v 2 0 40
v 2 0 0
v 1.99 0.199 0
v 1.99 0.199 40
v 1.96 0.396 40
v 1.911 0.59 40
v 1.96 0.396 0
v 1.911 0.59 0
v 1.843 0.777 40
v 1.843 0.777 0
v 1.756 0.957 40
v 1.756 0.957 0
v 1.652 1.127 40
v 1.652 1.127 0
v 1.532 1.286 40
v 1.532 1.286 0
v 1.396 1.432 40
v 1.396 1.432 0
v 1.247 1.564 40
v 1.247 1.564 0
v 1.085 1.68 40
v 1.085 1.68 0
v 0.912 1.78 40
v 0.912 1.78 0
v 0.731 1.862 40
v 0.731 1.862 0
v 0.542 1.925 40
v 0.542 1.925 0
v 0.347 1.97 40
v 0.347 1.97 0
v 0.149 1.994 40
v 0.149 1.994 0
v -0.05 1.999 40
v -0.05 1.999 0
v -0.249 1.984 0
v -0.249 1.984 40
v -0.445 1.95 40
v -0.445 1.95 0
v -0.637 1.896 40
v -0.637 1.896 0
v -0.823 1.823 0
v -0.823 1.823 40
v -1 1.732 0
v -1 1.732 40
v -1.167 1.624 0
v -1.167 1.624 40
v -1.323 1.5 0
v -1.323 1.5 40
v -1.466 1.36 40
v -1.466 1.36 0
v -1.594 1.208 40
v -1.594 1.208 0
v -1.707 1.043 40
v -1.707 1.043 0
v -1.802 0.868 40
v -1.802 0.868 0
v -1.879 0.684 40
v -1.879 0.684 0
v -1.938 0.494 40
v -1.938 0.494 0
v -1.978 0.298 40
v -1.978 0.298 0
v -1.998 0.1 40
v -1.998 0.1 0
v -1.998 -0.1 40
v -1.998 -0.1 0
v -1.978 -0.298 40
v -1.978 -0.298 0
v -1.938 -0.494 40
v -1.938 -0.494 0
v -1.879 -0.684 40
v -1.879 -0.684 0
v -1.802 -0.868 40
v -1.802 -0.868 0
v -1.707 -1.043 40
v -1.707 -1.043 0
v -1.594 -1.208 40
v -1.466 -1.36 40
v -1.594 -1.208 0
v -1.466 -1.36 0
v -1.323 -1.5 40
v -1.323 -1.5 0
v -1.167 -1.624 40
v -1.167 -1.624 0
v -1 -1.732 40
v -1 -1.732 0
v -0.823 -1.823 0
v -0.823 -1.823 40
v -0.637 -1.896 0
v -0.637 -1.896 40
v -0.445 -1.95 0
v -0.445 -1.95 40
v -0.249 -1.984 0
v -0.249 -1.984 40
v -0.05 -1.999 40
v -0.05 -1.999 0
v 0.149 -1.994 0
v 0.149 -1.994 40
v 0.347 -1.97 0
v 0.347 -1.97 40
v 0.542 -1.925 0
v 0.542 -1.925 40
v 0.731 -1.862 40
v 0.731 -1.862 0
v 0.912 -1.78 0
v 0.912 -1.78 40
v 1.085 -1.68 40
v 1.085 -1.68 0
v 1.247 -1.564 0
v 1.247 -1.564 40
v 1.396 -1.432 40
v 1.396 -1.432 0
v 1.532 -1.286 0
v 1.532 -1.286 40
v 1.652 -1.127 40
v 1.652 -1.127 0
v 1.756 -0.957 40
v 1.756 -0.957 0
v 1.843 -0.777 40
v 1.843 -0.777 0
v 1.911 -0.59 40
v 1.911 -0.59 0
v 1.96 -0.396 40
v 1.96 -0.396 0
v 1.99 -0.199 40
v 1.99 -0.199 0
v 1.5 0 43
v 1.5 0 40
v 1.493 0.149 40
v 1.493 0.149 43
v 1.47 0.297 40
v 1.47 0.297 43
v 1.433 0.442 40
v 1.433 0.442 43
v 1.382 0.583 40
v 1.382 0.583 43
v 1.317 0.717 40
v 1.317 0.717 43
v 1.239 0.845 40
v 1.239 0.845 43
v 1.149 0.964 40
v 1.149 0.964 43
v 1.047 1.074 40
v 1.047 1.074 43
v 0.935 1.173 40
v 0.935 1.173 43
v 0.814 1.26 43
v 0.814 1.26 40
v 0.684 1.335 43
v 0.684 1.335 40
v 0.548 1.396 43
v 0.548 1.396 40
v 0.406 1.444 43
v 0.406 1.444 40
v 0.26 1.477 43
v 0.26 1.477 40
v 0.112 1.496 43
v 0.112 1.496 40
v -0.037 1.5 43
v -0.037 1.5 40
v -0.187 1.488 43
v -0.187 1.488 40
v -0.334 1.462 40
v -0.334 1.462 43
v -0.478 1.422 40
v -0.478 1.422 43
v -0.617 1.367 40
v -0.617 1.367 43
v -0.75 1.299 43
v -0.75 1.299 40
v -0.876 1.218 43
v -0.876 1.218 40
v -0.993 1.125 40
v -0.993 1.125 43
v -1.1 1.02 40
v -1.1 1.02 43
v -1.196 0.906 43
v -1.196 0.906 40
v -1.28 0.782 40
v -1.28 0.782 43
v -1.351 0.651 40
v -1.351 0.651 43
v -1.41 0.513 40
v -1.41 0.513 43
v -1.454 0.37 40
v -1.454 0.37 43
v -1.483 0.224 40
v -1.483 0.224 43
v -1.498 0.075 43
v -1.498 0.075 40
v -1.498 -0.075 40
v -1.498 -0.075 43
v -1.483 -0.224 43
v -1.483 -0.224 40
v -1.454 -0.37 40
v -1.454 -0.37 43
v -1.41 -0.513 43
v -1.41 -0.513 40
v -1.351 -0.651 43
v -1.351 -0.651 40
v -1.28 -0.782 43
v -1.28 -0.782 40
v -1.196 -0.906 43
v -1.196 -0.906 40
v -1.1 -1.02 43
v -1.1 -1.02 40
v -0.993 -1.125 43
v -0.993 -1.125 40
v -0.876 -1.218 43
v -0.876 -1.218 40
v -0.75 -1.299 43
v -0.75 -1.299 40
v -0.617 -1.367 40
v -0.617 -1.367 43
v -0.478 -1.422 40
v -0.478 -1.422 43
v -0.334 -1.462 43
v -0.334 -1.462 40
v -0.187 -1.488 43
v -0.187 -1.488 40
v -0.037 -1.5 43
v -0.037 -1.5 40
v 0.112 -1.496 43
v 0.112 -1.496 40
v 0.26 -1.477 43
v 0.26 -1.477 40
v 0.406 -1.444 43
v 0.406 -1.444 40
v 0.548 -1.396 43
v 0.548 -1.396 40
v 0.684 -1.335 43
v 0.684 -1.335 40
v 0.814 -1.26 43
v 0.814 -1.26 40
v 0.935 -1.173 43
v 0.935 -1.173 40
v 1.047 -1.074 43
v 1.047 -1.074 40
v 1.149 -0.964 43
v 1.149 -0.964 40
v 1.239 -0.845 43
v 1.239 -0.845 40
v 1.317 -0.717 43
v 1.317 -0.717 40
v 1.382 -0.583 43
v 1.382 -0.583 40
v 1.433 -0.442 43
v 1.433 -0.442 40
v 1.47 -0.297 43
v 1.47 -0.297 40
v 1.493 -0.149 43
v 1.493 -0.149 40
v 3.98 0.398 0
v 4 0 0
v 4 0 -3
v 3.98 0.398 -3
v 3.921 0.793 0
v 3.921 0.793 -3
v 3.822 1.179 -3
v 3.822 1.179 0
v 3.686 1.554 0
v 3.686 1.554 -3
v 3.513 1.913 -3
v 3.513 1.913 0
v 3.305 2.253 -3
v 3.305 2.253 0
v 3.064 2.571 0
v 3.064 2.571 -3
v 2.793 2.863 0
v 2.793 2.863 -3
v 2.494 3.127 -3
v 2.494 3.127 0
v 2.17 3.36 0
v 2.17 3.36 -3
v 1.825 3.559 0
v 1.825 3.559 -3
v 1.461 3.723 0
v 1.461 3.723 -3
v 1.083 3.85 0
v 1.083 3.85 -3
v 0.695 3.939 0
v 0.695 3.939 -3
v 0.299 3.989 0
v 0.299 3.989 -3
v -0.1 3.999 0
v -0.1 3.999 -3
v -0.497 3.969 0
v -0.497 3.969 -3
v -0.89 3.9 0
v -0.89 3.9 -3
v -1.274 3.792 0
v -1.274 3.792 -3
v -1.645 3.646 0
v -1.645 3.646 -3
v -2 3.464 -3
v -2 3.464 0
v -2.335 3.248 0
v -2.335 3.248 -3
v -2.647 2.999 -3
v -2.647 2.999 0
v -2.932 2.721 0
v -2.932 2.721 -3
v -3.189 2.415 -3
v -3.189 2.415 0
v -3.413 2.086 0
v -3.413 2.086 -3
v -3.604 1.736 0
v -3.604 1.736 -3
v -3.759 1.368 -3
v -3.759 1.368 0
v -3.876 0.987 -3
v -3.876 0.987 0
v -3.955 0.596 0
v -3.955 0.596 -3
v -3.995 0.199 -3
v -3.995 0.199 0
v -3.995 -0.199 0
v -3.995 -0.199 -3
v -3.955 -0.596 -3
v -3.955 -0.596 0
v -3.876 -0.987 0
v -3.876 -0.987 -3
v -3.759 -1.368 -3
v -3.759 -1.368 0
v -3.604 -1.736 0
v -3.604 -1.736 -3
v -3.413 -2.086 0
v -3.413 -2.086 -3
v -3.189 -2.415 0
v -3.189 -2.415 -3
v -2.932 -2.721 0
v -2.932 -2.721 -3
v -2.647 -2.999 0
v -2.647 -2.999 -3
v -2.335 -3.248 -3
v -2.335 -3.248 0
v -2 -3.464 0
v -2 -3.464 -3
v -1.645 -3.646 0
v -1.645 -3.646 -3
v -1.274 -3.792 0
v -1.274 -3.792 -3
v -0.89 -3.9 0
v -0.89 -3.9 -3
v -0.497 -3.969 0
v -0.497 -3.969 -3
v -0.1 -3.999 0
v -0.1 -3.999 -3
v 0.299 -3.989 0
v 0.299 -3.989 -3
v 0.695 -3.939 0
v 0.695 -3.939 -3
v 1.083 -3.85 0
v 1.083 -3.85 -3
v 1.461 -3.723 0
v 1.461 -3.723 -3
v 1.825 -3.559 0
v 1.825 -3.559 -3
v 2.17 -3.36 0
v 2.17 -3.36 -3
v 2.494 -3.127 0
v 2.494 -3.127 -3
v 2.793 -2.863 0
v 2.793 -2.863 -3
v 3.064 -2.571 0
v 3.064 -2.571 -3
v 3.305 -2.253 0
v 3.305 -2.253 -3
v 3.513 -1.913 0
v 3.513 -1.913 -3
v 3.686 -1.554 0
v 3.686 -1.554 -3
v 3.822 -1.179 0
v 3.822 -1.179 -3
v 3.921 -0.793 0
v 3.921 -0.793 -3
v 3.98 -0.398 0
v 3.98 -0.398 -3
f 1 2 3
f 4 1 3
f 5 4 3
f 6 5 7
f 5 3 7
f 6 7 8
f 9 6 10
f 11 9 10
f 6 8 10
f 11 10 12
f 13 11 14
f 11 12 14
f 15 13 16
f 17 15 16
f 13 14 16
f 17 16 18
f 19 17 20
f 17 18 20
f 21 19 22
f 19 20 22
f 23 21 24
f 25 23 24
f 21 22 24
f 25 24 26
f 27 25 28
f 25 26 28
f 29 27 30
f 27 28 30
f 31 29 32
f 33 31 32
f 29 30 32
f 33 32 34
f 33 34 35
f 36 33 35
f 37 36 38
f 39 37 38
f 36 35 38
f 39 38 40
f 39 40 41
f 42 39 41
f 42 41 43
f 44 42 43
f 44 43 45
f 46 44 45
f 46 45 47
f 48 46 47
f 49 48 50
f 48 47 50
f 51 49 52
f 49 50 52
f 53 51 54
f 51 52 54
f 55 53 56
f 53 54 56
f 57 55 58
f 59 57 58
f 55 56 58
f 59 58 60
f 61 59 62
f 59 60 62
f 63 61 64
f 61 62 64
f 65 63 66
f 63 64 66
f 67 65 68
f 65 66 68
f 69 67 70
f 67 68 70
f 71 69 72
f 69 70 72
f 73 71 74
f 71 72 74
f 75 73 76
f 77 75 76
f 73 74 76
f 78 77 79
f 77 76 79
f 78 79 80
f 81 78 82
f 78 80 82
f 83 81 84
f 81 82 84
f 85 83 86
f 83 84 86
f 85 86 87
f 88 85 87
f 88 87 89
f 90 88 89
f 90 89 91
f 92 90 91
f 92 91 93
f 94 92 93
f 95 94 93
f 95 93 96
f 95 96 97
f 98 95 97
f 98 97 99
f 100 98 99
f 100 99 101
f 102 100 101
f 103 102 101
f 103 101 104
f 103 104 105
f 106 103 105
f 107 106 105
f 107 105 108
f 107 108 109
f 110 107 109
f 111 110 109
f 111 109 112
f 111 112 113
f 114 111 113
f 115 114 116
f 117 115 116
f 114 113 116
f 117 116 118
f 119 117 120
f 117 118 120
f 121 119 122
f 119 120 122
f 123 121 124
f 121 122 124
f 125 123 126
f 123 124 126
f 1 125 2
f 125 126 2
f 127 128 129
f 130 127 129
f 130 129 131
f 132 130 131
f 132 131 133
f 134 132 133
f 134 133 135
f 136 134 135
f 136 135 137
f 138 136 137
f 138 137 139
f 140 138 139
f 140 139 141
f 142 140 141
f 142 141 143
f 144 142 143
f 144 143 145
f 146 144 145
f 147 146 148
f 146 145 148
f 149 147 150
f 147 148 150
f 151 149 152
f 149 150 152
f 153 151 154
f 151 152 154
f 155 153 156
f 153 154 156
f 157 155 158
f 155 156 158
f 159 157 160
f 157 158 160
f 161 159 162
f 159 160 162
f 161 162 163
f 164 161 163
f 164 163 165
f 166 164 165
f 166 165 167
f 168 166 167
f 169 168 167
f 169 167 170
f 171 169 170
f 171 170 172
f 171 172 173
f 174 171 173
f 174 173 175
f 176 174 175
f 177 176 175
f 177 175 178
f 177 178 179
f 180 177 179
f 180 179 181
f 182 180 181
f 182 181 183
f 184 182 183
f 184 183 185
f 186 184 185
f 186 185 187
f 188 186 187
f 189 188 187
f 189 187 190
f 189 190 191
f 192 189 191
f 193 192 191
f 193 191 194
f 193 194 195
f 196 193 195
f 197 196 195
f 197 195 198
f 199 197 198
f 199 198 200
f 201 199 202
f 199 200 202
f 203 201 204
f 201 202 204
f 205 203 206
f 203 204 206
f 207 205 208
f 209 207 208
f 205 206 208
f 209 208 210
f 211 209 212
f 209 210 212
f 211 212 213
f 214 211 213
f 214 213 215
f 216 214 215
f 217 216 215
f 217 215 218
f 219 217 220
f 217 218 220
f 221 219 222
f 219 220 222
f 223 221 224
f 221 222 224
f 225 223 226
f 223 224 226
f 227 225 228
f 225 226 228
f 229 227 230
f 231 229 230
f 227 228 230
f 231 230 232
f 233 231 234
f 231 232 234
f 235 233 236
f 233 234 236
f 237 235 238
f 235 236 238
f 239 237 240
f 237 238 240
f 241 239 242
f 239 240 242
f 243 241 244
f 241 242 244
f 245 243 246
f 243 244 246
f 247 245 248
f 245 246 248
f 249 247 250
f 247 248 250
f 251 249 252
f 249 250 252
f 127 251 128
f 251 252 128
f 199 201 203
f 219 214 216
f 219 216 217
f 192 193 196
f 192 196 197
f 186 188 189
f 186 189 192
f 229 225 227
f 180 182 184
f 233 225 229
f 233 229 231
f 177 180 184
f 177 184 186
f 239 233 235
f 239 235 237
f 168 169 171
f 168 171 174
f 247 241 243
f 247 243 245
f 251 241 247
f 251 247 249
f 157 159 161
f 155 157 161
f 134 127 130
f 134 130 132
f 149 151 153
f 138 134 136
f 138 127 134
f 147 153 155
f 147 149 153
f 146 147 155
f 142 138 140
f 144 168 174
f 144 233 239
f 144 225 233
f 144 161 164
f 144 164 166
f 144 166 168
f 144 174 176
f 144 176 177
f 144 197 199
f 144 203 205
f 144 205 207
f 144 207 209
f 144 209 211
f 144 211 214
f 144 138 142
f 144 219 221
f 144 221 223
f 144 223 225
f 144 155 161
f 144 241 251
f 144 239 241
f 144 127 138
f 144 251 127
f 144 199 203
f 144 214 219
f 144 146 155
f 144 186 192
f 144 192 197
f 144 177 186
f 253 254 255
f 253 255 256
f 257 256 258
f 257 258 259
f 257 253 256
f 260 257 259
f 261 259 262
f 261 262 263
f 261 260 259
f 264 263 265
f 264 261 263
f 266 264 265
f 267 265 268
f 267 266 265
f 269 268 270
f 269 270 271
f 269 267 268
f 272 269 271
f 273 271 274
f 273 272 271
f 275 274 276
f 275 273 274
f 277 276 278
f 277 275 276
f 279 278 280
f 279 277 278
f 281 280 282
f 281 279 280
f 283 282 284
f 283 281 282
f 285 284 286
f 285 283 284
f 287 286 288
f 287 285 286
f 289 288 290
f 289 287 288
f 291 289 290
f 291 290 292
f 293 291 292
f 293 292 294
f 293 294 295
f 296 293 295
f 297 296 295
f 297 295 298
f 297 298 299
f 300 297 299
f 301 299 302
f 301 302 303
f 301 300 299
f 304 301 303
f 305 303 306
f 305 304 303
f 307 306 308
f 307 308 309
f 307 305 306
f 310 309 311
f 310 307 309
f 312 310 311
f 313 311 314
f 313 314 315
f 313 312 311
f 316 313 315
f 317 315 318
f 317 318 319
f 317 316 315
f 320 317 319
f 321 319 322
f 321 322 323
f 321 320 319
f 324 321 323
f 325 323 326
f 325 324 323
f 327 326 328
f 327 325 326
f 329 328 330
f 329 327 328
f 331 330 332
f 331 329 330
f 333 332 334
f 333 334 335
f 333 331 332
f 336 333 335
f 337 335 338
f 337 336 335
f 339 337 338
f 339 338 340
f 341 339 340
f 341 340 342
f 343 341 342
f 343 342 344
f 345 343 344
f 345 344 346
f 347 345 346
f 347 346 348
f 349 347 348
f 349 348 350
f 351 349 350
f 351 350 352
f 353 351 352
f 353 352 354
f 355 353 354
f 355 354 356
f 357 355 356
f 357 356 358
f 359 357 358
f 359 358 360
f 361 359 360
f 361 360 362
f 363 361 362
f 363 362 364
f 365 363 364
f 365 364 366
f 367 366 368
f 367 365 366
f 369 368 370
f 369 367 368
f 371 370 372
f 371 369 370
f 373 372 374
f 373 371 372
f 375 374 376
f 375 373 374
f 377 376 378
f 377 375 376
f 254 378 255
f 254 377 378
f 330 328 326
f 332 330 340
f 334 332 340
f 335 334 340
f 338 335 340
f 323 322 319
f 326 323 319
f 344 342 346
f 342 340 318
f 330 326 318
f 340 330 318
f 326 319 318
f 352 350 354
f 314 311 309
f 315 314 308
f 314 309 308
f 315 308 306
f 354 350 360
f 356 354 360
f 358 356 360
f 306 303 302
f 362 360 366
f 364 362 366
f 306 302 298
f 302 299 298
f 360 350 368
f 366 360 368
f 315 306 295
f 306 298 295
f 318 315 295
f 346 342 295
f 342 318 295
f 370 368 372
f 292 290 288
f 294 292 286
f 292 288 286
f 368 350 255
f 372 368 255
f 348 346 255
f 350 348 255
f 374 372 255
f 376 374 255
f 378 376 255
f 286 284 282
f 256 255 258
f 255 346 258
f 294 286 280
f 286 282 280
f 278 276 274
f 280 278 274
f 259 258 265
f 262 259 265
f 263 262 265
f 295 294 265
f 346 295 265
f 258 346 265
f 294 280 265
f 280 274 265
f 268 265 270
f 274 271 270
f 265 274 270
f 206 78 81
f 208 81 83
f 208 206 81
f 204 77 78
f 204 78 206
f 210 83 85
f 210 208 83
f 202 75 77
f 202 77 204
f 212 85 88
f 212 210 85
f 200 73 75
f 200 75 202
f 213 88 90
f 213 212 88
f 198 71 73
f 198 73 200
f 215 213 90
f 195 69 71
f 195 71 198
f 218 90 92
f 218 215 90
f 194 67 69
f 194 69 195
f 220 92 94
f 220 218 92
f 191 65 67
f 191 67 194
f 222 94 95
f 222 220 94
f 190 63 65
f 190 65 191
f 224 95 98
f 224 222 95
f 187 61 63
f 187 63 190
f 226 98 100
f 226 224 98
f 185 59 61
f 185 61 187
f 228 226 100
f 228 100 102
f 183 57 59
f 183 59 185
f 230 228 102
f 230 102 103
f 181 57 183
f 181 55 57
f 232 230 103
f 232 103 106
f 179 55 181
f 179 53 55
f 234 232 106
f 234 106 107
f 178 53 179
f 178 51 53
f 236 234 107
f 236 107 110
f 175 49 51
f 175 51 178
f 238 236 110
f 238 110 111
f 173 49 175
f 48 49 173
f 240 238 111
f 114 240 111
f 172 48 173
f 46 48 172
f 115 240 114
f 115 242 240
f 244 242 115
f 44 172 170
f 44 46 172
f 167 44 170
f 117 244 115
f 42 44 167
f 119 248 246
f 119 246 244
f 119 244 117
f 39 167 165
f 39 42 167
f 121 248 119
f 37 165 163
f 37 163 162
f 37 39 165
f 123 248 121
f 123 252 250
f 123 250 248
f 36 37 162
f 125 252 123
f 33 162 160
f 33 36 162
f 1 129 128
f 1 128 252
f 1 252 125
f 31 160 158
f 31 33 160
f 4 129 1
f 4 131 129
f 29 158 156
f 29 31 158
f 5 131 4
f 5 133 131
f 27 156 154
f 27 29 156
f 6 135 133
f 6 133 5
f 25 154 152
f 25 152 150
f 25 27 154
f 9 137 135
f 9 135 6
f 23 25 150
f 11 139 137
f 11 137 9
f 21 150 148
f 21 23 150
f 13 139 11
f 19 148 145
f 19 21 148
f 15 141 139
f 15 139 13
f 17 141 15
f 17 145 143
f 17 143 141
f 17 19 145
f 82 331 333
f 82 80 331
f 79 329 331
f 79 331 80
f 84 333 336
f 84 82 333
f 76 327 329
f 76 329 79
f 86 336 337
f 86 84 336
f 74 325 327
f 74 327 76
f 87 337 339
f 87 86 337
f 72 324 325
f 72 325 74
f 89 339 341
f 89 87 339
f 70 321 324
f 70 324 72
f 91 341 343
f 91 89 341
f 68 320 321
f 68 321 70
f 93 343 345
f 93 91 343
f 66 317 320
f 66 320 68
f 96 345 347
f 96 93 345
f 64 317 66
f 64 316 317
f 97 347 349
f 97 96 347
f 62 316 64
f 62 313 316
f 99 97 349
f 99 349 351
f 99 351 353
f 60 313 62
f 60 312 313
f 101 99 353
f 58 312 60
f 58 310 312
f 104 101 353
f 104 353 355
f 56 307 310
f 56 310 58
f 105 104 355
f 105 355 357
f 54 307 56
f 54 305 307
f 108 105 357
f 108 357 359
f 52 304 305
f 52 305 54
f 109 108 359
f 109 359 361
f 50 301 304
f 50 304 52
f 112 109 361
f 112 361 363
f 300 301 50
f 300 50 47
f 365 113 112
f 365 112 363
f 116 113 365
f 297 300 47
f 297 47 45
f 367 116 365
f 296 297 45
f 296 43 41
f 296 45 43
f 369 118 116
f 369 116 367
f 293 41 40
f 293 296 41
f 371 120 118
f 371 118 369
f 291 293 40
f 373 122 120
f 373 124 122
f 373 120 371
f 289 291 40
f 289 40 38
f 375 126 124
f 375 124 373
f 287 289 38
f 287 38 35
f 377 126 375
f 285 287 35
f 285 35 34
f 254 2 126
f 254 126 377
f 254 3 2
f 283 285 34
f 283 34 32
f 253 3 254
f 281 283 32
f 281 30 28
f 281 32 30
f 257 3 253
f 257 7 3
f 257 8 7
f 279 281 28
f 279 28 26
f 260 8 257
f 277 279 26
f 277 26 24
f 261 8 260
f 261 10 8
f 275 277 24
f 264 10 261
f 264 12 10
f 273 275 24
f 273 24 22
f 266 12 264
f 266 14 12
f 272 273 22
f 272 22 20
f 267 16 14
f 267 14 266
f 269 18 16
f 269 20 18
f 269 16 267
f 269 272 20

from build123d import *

# Parameters (mm, degrees)
SKETCH1_R           = 2
BOSS_EXTRUDE1_DEPTH = 40
SKETCH3_R           = 1.5
BOSS_EXTRUDE2_DEPTH = 43
SKETCH4_R           = 4
BOSS_EXTRUDE3_DEPTH = 3


with BuildPart() as part:
    # Sketch1 → Boss-Extrude1 (new body)
    with BuildSketch(Plane.XY):
        Circle(SKETCH1_R)
    extrude(amount=BOSS_EXTRUDE1_DEPTH)

    # Sketch3 → Boss-Extrude2 (add)
    with BuildSketch(Plane.XY):
        Circle(SKETCH3_R)
    extrude(amount=BOSS_EXTRUDE2_DEPTH)

    # Sketch4 → Boss-Extrude3 (add)
    with BuildSketch(Plane.XY):
        Circle(SKETCH4_R)
    extrude(amount=-BOSS_EXTRUDE3_DEPTH)


solid = part.part
